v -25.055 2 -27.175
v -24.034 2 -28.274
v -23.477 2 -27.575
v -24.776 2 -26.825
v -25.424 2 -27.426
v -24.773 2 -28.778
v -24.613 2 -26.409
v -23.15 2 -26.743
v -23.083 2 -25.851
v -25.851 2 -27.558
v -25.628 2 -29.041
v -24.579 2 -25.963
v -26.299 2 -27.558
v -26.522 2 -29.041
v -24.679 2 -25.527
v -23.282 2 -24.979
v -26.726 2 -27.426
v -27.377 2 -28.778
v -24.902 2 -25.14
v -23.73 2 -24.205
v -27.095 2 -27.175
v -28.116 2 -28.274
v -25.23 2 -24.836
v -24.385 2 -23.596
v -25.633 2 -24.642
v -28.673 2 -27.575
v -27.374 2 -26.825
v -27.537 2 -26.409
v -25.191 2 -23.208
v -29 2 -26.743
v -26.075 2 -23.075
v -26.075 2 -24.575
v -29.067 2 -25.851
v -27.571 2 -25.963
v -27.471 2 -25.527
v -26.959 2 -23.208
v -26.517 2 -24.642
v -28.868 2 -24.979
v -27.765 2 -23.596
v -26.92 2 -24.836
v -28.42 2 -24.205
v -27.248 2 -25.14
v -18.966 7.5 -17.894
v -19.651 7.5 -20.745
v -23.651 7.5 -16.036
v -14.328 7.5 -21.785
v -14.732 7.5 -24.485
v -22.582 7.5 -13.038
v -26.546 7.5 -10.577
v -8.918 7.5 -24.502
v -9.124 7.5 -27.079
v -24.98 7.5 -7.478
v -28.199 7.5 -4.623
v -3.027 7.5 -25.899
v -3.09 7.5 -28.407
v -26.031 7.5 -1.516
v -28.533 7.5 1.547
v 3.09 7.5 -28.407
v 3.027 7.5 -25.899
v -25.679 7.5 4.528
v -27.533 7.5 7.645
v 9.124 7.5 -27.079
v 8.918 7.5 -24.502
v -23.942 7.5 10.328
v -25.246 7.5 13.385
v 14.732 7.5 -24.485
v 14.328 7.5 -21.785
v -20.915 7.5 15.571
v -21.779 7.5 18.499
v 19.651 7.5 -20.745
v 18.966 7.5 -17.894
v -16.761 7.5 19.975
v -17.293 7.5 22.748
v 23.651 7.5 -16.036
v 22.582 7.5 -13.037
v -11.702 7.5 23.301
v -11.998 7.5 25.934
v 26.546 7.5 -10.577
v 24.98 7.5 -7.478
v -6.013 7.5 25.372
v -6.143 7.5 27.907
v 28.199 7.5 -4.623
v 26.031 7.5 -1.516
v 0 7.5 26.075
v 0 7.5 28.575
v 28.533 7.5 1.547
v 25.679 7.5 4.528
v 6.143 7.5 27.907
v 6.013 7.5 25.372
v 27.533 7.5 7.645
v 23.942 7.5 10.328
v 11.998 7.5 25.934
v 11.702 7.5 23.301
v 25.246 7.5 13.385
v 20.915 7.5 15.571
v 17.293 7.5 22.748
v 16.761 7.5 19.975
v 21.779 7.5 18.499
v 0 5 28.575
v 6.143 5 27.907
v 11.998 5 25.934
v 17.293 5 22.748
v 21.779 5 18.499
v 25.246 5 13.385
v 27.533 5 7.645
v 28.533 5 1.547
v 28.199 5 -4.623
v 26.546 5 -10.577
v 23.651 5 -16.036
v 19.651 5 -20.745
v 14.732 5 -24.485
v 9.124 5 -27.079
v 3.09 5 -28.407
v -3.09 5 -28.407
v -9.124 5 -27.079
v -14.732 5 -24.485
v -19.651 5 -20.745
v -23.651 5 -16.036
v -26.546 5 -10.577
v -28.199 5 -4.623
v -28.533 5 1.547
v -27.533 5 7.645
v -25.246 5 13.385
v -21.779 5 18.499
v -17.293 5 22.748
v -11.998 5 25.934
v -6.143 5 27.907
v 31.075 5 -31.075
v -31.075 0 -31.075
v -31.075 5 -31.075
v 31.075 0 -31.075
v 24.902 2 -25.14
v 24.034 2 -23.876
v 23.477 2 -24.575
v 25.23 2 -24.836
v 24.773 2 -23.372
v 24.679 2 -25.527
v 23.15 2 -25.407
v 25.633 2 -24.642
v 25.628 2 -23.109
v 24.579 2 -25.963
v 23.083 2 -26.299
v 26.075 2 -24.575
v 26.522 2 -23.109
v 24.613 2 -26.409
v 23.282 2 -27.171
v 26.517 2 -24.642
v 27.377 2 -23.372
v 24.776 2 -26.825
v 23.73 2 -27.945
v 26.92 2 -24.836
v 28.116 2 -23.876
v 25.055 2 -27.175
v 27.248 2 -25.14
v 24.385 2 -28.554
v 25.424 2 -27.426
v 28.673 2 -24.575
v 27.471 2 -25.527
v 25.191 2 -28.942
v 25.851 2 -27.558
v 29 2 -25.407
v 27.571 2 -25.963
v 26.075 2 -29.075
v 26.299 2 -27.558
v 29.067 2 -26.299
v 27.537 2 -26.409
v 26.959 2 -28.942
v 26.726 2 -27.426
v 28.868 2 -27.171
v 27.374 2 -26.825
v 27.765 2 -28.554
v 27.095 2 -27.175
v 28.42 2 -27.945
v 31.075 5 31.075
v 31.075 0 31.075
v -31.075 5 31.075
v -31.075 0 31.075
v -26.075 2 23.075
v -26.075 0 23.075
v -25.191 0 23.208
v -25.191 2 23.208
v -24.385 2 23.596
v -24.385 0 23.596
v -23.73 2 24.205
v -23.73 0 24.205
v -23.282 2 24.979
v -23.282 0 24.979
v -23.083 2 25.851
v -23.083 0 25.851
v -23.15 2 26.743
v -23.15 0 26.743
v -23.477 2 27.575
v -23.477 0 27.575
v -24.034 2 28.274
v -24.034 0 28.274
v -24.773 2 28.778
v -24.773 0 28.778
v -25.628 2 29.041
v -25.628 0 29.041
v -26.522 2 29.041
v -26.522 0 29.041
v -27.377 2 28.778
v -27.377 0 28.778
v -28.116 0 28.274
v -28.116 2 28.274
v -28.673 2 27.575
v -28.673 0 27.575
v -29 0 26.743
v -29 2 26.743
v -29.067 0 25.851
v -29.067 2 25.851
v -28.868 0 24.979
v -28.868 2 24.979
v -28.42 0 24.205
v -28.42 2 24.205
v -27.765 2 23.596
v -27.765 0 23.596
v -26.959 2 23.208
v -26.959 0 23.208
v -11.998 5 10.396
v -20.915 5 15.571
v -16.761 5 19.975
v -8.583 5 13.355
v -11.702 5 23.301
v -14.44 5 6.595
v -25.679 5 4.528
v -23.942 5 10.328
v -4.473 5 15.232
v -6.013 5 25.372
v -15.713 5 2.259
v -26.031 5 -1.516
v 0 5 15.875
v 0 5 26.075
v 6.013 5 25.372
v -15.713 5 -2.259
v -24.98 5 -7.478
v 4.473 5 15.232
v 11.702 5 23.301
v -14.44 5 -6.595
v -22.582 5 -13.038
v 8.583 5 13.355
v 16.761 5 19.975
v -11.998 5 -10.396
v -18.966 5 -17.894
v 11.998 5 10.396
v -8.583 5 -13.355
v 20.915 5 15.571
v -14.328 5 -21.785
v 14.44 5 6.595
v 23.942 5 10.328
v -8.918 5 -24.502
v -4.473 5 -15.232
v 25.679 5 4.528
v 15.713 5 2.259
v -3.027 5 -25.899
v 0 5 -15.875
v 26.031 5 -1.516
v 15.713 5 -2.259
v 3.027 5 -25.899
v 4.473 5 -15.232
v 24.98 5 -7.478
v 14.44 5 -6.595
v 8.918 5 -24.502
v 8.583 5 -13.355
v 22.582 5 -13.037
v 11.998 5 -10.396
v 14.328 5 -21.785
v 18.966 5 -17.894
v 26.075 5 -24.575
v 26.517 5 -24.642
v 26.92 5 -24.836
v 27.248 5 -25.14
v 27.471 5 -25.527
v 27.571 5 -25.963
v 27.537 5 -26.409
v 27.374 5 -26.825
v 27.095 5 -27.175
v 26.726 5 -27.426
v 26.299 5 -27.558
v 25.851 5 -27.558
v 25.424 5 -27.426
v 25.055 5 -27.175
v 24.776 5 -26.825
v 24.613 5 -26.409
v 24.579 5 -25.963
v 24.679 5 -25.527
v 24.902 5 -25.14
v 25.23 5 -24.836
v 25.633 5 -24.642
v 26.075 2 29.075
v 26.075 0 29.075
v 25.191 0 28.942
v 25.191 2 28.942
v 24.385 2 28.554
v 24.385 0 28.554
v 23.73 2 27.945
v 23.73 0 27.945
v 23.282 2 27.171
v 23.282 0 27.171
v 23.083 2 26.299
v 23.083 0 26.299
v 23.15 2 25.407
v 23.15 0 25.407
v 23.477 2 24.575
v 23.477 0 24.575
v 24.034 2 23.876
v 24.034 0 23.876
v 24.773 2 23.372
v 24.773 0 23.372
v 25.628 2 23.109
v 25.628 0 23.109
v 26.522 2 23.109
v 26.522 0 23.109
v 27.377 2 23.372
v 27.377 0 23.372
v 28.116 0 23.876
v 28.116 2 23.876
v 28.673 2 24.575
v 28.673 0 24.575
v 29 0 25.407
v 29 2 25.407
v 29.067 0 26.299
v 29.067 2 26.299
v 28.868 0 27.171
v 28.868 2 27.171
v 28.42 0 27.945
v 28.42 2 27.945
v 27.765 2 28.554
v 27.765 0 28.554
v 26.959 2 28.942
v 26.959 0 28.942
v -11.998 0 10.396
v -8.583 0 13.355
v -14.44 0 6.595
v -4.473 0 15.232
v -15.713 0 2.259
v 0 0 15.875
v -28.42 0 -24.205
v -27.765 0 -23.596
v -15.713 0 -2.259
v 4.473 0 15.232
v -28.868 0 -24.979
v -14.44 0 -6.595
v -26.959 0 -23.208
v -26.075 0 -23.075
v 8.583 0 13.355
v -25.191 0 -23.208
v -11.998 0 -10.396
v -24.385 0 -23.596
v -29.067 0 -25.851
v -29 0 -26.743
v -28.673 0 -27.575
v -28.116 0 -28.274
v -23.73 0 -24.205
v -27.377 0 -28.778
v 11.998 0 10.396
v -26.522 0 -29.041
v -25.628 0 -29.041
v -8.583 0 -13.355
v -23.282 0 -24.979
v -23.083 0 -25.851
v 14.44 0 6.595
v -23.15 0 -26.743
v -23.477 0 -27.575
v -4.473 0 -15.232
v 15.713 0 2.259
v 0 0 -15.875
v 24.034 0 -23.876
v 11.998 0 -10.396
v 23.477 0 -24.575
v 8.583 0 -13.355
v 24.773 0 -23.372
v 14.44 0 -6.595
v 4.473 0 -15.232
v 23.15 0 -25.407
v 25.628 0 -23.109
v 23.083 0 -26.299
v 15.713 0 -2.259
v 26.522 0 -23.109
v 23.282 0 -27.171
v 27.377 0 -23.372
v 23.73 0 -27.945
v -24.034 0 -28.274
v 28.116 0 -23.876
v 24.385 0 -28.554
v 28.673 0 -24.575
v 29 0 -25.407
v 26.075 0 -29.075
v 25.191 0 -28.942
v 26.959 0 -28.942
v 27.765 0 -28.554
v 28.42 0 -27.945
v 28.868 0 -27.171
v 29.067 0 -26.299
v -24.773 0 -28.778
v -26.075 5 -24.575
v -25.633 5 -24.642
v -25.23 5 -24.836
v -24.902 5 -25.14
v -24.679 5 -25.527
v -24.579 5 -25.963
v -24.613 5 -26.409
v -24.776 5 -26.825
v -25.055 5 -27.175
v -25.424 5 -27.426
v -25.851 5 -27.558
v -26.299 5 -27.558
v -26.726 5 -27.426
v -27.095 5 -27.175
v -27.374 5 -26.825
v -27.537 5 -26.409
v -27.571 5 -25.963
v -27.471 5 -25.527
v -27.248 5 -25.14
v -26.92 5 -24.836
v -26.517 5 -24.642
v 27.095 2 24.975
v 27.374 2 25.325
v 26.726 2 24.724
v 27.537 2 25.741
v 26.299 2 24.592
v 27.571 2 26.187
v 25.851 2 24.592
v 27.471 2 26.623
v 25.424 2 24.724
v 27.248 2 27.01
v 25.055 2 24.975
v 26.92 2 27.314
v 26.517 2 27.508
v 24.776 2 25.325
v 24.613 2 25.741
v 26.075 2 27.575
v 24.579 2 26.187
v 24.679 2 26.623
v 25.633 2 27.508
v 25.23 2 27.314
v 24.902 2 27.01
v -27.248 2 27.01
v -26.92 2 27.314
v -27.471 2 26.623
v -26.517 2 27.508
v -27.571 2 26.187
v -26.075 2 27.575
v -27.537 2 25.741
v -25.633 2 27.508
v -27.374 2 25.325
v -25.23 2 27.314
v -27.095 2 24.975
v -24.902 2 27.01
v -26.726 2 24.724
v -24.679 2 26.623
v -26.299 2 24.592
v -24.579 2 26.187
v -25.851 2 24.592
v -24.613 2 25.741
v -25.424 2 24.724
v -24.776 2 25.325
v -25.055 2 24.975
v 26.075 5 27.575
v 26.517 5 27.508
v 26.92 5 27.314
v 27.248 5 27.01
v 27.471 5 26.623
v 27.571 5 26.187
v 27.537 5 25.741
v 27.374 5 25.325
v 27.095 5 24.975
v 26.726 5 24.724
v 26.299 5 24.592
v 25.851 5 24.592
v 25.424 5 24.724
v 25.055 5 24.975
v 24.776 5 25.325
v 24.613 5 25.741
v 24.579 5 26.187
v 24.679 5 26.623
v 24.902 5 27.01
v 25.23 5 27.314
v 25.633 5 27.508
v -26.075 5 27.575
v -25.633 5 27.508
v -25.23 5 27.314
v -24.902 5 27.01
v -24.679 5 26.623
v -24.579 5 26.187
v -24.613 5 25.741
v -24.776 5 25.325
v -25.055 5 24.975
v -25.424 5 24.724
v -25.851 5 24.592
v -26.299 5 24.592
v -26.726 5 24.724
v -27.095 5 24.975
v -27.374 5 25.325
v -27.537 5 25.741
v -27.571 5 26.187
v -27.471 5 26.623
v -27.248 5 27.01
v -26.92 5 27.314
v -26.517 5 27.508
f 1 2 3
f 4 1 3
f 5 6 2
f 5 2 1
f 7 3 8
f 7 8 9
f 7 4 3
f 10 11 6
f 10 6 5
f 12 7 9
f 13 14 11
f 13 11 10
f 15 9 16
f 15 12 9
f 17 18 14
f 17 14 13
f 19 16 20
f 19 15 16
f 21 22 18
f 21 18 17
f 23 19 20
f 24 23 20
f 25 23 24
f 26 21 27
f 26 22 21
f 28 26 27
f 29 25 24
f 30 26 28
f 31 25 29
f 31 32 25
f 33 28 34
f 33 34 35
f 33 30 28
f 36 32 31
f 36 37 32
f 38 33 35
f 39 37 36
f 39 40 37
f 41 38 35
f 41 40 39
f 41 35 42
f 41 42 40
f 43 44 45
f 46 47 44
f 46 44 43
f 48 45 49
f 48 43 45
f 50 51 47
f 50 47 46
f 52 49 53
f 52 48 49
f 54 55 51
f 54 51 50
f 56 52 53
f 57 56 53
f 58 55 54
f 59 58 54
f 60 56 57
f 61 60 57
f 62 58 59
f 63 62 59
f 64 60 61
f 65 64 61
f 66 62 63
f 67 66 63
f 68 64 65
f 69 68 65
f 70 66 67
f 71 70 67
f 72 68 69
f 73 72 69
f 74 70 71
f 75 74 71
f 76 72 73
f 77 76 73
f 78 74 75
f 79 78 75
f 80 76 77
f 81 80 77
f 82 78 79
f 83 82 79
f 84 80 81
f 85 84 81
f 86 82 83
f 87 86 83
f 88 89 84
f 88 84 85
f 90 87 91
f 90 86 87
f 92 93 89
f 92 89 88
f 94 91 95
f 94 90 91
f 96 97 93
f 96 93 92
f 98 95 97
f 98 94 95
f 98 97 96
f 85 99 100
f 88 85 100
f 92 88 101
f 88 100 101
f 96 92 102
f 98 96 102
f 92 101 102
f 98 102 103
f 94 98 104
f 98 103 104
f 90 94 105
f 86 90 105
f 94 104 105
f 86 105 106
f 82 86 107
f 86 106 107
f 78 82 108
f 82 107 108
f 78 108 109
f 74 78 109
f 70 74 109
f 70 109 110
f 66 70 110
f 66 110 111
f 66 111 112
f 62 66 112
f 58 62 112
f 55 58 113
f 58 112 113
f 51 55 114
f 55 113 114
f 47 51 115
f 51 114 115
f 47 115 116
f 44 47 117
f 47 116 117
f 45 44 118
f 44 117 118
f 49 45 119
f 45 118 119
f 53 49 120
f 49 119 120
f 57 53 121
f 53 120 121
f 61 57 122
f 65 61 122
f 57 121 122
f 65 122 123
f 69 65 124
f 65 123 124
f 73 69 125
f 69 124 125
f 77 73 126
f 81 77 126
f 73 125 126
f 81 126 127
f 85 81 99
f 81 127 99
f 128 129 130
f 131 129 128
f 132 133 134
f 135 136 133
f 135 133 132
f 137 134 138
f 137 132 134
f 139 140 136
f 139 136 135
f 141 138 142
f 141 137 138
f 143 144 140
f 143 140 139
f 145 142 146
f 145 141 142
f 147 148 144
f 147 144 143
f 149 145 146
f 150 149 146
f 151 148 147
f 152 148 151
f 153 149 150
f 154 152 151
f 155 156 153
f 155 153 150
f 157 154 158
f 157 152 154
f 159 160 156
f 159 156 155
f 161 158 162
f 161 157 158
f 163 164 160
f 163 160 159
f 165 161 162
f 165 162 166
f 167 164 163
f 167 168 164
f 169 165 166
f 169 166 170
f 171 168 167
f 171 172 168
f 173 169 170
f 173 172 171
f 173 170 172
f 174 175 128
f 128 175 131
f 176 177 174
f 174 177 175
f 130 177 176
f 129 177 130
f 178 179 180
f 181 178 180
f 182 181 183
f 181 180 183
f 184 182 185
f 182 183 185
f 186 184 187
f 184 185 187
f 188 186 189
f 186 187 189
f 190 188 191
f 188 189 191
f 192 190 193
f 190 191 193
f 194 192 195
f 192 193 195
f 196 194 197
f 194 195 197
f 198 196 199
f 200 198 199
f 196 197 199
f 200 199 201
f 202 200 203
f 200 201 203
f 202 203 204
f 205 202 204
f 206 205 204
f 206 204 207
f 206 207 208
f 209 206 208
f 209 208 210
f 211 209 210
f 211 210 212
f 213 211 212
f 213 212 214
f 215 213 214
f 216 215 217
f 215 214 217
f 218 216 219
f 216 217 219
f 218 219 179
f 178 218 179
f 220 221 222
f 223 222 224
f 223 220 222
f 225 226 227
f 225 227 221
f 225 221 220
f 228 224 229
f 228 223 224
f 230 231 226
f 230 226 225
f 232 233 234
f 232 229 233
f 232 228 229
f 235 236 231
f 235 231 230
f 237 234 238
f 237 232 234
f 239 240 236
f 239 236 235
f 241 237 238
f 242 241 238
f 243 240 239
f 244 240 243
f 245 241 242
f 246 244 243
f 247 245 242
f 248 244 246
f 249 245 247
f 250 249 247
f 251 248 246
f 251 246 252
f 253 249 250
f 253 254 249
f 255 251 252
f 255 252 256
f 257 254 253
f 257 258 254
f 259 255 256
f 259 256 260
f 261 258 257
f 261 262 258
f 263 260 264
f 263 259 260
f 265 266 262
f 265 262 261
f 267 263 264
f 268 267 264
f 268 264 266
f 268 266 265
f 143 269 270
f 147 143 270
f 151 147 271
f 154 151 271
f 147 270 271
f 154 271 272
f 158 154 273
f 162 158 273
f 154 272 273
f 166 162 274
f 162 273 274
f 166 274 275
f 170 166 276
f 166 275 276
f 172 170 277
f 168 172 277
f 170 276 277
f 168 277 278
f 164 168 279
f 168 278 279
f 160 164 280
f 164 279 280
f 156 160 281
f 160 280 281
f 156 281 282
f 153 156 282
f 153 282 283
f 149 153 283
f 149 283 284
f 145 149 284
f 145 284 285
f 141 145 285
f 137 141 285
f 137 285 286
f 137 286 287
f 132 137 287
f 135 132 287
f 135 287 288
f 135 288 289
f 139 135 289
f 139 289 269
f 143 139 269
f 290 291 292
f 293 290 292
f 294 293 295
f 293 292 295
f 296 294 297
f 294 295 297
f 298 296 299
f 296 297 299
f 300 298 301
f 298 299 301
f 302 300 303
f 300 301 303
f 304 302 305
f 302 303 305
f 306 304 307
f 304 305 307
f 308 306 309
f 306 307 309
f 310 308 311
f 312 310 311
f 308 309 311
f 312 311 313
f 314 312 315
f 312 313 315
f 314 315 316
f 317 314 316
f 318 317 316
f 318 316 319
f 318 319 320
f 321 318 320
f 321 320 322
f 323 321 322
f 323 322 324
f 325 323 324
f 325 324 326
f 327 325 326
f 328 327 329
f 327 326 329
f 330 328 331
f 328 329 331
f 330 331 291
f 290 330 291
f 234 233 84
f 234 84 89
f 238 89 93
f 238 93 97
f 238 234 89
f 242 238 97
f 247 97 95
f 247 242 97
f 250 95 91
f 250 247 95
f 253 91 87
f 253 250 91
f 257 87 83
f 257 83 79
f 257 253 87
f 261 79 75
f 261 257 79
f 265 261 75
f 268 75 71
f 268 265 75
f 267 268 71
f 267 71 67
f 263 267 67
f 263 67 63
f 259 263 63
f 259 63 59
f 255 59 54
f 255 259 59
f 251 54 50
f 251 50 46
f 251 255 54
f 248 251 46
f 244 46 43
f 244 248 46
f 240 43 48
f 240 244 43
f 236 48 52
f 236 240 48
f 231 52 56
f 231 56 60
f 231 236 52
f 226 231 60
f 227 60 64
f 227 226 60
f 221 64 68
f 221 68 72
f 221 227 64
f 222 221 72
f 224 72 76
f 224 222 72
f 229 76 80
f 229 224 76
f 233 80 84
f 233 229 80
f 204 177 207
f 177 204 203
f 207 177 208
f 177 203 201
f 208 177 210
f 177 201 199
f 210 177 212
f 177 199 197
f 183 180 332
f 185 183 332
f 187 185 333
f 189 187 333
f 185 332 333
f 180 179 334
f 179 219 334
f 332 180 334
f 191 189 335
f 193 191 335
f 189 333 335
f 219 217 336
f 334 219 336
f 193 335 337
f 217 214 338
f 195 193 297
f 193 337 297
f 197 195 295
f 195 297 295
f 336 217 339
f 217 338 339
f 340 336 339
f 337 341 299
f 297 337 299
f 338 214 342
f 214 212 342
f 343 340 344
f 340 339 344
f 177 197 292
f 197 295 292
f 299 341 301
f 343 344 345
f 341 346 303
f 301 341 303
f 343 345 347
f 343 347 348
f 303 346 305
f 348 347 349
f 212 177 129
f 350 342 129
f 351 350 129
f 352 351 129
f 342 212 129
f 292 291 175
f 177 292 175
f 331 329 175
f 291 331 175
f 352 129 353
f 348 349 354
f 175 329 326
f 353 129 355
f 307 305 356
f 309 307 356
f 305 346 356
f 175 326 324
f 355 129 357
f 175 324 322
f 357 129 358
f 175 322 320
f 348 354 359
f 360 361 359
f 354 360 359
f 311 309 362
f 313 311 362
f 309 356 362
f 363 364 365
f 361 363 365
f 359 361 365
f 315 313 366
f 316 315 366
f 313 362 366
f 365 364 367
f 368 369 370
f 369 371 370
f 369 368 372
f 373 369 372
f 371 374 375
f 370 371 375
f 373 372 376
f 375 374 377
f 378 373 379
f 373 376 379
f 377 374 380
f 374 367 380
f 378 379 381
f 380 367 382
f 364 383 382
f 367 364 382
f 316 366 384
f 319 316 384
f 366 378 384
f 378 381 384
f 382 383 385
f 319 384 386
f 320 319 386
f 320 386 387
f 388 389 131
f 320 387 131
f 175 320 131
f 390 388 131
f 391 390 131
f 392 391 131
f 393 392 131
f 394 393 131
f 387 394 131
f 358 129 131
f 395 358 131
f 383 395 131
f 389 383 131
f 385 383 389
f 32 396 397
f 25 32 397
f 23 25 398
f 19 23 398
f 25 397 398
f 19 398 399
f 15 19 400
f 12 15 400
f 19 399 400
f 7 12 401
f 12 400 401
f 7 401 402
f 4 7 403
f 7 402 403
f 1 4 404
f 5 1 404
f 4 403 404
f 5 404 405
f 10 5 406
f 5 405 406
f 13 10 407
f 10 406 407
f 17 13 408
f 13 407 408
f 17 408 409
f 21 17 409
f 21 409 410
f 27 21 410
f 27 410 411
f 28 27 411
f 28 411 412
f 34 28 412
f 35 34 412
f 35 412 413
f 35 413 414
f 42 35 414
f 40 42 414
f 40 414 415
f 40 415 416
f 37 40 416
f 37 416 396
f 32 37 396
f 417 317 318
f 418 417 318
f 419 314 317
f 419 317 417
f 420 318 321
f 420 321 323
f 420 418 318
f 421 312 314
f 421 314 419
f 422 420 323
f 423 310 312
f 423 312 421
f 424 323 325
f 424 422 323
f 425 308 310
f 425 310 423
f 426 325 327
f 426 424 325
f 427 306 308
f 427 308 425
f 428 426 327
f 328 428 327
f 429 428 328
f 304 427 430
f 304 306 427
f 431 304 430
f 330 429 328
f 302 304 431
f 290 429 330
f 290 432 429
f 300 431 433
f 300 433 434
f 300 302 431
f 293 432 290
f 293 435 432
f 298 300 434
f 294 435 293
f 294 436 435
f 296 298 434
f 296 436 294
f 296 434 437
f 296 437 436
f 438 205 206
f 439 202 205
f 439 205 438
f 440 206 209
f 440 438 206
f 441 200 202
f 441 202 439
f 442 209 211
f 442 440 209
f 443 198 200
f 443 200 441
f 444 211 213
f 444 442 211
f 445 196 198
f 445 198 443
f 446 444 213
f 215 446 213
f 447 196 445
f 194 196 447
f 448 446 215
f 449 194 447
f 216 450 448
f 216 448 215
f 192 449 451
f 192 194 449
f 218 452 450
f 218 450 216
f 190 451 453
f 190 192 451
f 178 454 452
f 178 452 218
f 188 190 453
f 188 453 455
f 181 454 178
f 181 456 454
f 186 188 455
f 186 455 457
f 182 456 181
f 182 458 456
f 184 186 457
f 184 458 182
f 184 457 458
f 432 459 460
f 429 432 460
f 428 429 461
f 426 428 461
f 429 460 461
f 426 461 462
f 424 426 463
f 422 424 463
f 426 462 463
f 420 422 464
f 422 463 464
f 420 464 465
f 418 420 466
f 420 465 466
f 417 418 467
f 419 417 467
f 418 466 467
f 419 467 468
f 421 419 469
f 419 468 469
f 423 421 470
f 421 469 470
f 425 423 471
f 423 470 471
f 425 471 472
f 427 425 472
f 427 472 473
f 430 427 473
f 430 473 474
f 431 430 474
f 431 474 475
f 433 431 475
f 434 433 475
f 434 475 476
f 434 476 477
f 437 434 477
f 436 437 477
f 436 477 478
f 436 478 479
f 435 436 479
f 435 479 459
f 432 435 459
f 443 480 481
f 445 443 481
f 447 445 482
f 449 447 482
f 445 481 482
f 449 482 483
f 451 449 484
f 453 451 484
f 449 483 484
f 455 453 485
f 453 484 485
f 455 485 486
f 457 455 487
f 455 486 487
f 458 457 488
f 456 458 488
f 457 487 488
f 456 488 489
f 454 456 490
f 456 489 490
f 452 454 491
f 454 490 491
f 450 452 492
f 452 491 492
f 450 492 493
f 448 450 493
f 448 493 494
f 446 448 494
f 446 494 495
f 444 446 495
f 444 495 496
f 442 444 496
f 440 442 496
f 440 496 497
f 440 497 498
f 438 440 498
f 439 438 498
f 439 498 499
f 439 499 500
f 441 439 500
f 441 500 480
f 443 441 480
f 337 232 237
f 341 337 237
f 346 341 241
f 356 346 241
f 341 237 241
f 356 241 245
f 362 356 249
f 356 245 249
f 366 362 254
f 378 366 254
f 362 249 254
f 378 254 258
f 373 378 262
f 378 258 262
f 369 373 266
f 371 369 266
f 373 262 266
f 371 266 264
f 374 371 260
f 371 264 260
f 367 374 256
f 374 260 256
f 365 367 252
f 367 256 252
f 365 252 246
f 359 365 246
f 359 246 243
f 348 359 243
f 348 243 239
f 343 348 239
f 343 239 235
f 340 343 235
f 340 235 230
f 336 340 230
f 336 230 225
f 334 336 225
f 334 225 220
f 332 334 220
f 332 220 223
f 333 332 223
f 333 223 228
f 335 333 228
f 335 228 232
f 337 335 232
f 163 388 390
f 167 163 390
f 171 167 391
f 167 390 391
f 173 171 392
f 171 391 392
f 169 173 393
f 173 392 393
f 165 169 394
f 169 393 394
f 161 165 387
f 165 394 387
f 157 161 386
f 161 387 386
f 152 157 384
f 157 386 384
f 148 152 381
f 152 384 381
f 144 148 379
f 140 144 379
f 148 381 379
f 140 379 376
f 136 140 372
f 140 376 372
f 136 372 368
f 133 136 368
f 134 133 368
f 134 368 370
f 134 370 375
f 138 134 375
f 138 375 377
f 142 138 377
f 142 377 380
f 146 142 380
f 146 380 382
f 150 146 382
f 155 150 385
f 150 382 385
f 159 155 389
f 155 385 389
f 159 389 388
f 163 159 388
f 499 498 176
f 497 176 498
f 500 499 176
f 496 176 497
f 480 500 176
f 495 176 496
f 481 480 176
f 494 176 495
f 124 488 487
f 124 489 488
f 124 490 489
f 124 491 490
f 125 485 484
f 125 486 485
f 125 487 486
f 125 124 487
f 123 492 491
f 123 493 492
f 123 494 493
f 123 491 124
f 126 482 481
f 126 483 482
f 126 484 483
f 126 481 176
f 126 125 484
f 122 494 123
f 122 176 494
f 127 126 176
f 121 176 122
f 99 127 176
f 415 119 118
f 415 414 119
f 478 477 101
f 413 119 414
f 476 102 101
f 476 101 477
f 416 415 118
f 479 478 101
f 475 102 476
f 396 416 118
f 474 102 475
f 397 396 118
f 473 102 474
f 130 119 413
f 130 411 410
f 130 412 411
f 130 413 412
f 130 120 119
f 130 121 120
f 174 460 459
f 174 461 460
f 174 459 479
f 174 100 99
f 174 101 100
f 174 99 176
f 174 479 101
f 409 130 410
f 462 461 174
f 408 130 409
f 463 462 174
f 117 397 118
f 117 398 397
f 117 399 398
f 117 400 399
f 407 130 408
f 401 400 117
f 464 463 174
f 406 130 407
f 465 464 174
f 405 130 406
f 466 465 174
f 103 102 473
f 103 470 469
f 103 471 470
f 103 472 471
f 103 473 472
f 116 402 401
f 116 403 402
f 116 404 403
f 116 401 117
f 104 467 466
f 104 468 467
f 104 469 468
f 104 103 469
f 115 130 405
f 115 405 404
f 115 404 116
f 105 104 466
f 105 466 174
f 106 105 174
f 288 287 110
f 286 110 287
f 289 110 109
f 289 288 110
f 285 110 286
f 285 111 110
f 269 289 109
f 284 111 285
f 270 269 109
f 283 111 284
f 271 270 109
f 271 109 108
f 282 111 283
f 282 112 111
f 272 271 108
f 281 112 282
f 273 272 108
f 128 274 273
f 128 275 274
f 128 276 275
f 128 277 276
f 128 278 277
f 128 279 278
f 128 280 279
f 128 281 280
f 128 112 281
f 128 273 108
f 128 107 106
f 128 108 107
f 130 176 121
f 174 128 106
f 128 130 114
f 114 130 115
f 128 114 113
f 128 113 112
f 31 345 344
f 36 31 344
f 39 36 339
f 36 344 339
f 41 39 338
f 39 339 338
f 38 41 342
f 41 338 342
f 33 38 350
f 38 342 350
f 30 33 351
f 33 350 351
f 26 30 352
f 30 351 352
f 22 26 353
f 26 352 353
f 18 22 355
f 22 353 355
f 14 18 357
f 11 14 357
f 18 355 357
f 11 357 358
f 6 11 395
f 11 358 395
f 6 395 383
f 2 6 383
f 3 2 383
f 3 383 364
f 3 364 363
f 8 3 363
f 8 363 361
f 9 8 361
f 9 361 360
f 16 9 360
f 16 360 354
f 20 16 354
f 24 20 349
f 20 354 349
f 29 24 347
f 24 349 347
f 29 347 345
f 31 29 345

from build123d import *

# Parameters (mm, degrees)
SKETCH1_W           = 62.15
SKETCH1_H           = 62.15
BOSS_EXTRUDE1_DEPTH = 5
CUT_EXTRUDE1_REACH  = 46.23
SKETCH2_R           = 1.5
SKETCH3_R           = 28.575
SKETCH3_R_2         = 26.075
BOSS_EXTRUDE2_DEPTH = 2.5
CUT_EXTRUDE2_REACH  = 46.23
SKETCH4_R           = 15.875
SKETCH5_R           = 3
CUT_EXTRUDE3_DEPTH  = 2


with BuildPart() as part:
    # Sketch1 → Boss-Extrude1 (new body)
    with BuildSketch(Plane(origin=(0, 0, 0), x_dir=(1, 0, 0), z_dir=(0, 1, 0))):
        Rectangle(SKETCH1_W, SKETCH1_H)
    extrude(amount=BOSS_EXTRUDE1_DEPTH)

    # Sketch2 → Cut-Extrude1 (cut, up to next)
    with BuildSketch(Plane(origin=(0, 5, 0), x_dir=(1, 0, 0), z_dir=(0, 1, 0)), mode=Mode.PRIVATE) as cut_extrude1_sk1:
        with Locations(Location((-26.075, 26.075, 0), (0, 0, 270))):
            Circle(SKETCH2_R)
    cut_extrude1_tool1 = extrude(cut_extrude1_sk1.sketch, amount=-CUT_EXTRUDE1_REACH, mode=Mode.PRIVATE) & part.part
    # Sketch2 → Cut-Extrude1 (cut, up to next)
    with BuildSketch(Plane(origin=(0, 5, 0), x_dir=(1, 0, 0), z_dir=(0, 1, 0)), mode=Mode.PRIVATE) as cut_extrude1_sk2:
        with Locations(Location((-26.075, -26.075, 0), (0, 0, 270))):
            Circle(SKETCH2_R)
    cut_extrude1_tool2 = extrude(cut_extrude1_sk2.sketch, amount=-CUT_EXTRUDE1_REACH, mode=Mode.PRIVATE) & part.part
    # Sketch2 → Cut-Extrude1 (cut, up to next)
    with BuildSketch(Plane(origin=(0, 5, 0), x_dir=(1, 0, 0), z_dir=(0, 1, 0)), mode=Mode.PRIVATE) as cut_extrude1_sk3:
        with Locations(Location((26.075, -26.075, 0), (0, 0, 270))):
            Circle(SKETCH2_R)
    cut_extrude1_tool3 = extrude(cut_extrude1_sk3.sketch, amount=-CUT_EXTRUDE1_REACH, mode=Mode.PRIVATE) & part.part
    # Sketch2 → Cut-Extrude1 (cut, up to next)
    with BuildSketch(Plane(origin=(0, 5, 0), x_dir=(1, 0, 0), z_dir=(0, 1, 0)), mode=Mode.PRIVATE) as cut_extrude1_sk4:
        with Locations(Location((26.075, 26.075, 0), (0, 0, 270))):
            Circle(SKETCH2_R)
    cut_extrude1_tool4 = extrude(cut_extrude1_sk4.sketch, amount=-CUT_EXTRUDE1_REACH, mode=Mode.PRIVATE) & part.part
    add(cut_extrude1_tool1.solids().sort_by_distance((-26.075, 5, -26.075))[0], mode=Mode.SUBTRACT)
    add(cut_extrude1_tool2.solids().sort_by_distance((-26.075, 5, 26.075))[0], mode=Mode.SUBTRACT)
    add(cut_extrude1_tool3.solids().sort_by_distance((26.075, 5, 26.075))[0], mode=Mode.SUBTRACT)
    add(cut_extrude1_tool4.solids().sort_by_distance((26.075, 5, -26.075))[0], mode=Mode.SUBTRACT)

    # Sketch3 → Boss-Extrude2 (add)
    with BuildSketch(Plane(origin=(0, 5, 0), x_dir=(1, 0, 0), z_dir=(0, 1, 0))):
        with Locations(Location((0, 0, 0), (0, 0, 270))):
            Circle(SKETCH3_R)
        with Locations(Location((0, 0, 0), (0, 0, 270))):
            Circle(SKETCH3_R_2, mode=Mode.SUBTRACT)
    extrude(amount=BOSS_EXTRUDE2_DEPTH)

    # Sketch4 → Cut-Extrude2 (cut, up to next)
    with BuildSketch(Plane(origin=(0, 5, 0), x_dir=(1, 0, 0), z_dir=(0, 1, 0)), mode=Mode.PRIVATE) as cut_extrude2_sk1:
        with Locations(Location((0, 0, 0), (0, 0, 270))):
            Circle(SKETCH4_R)
    cut_extrude2_tool1 = extrude(cut_extrude2_sk1.sketch, amount=-CUT_EXTRUDE2_REACH, mode=Mode.PRIVATE) & part.part
    add(cut_extrude2_tool1.solids().sort_by_distance((0, 5, 0))[0], mode=Mode.SUBTRACT)

    # Sketch5 → Cut-Extrude3 (cut)
    with BuildSketch(Plane.XZ):
        with Locations(Location((-26.075, 26.075, 0), (0, 0, 270))):
            Circle(SKETCH5_R)
        with Locations(Location((-26.075, -26.075, 0), (0, 0, 90))):
            Circle(SKETCH5_R)
        with Locations(Location((26.075, -26.075, 0), (0, 0, 270))):
            Circle(SKETCH5_R)
        with Locations(Location((26.075, 26.075, 0), (0, 0, 90))):
            Circle(SKETCH5_R)
    extrude(amount=-CUT_EXTRUDE3_DEPTH, mode=Mode.SUBTRACT)


solid = part.part
